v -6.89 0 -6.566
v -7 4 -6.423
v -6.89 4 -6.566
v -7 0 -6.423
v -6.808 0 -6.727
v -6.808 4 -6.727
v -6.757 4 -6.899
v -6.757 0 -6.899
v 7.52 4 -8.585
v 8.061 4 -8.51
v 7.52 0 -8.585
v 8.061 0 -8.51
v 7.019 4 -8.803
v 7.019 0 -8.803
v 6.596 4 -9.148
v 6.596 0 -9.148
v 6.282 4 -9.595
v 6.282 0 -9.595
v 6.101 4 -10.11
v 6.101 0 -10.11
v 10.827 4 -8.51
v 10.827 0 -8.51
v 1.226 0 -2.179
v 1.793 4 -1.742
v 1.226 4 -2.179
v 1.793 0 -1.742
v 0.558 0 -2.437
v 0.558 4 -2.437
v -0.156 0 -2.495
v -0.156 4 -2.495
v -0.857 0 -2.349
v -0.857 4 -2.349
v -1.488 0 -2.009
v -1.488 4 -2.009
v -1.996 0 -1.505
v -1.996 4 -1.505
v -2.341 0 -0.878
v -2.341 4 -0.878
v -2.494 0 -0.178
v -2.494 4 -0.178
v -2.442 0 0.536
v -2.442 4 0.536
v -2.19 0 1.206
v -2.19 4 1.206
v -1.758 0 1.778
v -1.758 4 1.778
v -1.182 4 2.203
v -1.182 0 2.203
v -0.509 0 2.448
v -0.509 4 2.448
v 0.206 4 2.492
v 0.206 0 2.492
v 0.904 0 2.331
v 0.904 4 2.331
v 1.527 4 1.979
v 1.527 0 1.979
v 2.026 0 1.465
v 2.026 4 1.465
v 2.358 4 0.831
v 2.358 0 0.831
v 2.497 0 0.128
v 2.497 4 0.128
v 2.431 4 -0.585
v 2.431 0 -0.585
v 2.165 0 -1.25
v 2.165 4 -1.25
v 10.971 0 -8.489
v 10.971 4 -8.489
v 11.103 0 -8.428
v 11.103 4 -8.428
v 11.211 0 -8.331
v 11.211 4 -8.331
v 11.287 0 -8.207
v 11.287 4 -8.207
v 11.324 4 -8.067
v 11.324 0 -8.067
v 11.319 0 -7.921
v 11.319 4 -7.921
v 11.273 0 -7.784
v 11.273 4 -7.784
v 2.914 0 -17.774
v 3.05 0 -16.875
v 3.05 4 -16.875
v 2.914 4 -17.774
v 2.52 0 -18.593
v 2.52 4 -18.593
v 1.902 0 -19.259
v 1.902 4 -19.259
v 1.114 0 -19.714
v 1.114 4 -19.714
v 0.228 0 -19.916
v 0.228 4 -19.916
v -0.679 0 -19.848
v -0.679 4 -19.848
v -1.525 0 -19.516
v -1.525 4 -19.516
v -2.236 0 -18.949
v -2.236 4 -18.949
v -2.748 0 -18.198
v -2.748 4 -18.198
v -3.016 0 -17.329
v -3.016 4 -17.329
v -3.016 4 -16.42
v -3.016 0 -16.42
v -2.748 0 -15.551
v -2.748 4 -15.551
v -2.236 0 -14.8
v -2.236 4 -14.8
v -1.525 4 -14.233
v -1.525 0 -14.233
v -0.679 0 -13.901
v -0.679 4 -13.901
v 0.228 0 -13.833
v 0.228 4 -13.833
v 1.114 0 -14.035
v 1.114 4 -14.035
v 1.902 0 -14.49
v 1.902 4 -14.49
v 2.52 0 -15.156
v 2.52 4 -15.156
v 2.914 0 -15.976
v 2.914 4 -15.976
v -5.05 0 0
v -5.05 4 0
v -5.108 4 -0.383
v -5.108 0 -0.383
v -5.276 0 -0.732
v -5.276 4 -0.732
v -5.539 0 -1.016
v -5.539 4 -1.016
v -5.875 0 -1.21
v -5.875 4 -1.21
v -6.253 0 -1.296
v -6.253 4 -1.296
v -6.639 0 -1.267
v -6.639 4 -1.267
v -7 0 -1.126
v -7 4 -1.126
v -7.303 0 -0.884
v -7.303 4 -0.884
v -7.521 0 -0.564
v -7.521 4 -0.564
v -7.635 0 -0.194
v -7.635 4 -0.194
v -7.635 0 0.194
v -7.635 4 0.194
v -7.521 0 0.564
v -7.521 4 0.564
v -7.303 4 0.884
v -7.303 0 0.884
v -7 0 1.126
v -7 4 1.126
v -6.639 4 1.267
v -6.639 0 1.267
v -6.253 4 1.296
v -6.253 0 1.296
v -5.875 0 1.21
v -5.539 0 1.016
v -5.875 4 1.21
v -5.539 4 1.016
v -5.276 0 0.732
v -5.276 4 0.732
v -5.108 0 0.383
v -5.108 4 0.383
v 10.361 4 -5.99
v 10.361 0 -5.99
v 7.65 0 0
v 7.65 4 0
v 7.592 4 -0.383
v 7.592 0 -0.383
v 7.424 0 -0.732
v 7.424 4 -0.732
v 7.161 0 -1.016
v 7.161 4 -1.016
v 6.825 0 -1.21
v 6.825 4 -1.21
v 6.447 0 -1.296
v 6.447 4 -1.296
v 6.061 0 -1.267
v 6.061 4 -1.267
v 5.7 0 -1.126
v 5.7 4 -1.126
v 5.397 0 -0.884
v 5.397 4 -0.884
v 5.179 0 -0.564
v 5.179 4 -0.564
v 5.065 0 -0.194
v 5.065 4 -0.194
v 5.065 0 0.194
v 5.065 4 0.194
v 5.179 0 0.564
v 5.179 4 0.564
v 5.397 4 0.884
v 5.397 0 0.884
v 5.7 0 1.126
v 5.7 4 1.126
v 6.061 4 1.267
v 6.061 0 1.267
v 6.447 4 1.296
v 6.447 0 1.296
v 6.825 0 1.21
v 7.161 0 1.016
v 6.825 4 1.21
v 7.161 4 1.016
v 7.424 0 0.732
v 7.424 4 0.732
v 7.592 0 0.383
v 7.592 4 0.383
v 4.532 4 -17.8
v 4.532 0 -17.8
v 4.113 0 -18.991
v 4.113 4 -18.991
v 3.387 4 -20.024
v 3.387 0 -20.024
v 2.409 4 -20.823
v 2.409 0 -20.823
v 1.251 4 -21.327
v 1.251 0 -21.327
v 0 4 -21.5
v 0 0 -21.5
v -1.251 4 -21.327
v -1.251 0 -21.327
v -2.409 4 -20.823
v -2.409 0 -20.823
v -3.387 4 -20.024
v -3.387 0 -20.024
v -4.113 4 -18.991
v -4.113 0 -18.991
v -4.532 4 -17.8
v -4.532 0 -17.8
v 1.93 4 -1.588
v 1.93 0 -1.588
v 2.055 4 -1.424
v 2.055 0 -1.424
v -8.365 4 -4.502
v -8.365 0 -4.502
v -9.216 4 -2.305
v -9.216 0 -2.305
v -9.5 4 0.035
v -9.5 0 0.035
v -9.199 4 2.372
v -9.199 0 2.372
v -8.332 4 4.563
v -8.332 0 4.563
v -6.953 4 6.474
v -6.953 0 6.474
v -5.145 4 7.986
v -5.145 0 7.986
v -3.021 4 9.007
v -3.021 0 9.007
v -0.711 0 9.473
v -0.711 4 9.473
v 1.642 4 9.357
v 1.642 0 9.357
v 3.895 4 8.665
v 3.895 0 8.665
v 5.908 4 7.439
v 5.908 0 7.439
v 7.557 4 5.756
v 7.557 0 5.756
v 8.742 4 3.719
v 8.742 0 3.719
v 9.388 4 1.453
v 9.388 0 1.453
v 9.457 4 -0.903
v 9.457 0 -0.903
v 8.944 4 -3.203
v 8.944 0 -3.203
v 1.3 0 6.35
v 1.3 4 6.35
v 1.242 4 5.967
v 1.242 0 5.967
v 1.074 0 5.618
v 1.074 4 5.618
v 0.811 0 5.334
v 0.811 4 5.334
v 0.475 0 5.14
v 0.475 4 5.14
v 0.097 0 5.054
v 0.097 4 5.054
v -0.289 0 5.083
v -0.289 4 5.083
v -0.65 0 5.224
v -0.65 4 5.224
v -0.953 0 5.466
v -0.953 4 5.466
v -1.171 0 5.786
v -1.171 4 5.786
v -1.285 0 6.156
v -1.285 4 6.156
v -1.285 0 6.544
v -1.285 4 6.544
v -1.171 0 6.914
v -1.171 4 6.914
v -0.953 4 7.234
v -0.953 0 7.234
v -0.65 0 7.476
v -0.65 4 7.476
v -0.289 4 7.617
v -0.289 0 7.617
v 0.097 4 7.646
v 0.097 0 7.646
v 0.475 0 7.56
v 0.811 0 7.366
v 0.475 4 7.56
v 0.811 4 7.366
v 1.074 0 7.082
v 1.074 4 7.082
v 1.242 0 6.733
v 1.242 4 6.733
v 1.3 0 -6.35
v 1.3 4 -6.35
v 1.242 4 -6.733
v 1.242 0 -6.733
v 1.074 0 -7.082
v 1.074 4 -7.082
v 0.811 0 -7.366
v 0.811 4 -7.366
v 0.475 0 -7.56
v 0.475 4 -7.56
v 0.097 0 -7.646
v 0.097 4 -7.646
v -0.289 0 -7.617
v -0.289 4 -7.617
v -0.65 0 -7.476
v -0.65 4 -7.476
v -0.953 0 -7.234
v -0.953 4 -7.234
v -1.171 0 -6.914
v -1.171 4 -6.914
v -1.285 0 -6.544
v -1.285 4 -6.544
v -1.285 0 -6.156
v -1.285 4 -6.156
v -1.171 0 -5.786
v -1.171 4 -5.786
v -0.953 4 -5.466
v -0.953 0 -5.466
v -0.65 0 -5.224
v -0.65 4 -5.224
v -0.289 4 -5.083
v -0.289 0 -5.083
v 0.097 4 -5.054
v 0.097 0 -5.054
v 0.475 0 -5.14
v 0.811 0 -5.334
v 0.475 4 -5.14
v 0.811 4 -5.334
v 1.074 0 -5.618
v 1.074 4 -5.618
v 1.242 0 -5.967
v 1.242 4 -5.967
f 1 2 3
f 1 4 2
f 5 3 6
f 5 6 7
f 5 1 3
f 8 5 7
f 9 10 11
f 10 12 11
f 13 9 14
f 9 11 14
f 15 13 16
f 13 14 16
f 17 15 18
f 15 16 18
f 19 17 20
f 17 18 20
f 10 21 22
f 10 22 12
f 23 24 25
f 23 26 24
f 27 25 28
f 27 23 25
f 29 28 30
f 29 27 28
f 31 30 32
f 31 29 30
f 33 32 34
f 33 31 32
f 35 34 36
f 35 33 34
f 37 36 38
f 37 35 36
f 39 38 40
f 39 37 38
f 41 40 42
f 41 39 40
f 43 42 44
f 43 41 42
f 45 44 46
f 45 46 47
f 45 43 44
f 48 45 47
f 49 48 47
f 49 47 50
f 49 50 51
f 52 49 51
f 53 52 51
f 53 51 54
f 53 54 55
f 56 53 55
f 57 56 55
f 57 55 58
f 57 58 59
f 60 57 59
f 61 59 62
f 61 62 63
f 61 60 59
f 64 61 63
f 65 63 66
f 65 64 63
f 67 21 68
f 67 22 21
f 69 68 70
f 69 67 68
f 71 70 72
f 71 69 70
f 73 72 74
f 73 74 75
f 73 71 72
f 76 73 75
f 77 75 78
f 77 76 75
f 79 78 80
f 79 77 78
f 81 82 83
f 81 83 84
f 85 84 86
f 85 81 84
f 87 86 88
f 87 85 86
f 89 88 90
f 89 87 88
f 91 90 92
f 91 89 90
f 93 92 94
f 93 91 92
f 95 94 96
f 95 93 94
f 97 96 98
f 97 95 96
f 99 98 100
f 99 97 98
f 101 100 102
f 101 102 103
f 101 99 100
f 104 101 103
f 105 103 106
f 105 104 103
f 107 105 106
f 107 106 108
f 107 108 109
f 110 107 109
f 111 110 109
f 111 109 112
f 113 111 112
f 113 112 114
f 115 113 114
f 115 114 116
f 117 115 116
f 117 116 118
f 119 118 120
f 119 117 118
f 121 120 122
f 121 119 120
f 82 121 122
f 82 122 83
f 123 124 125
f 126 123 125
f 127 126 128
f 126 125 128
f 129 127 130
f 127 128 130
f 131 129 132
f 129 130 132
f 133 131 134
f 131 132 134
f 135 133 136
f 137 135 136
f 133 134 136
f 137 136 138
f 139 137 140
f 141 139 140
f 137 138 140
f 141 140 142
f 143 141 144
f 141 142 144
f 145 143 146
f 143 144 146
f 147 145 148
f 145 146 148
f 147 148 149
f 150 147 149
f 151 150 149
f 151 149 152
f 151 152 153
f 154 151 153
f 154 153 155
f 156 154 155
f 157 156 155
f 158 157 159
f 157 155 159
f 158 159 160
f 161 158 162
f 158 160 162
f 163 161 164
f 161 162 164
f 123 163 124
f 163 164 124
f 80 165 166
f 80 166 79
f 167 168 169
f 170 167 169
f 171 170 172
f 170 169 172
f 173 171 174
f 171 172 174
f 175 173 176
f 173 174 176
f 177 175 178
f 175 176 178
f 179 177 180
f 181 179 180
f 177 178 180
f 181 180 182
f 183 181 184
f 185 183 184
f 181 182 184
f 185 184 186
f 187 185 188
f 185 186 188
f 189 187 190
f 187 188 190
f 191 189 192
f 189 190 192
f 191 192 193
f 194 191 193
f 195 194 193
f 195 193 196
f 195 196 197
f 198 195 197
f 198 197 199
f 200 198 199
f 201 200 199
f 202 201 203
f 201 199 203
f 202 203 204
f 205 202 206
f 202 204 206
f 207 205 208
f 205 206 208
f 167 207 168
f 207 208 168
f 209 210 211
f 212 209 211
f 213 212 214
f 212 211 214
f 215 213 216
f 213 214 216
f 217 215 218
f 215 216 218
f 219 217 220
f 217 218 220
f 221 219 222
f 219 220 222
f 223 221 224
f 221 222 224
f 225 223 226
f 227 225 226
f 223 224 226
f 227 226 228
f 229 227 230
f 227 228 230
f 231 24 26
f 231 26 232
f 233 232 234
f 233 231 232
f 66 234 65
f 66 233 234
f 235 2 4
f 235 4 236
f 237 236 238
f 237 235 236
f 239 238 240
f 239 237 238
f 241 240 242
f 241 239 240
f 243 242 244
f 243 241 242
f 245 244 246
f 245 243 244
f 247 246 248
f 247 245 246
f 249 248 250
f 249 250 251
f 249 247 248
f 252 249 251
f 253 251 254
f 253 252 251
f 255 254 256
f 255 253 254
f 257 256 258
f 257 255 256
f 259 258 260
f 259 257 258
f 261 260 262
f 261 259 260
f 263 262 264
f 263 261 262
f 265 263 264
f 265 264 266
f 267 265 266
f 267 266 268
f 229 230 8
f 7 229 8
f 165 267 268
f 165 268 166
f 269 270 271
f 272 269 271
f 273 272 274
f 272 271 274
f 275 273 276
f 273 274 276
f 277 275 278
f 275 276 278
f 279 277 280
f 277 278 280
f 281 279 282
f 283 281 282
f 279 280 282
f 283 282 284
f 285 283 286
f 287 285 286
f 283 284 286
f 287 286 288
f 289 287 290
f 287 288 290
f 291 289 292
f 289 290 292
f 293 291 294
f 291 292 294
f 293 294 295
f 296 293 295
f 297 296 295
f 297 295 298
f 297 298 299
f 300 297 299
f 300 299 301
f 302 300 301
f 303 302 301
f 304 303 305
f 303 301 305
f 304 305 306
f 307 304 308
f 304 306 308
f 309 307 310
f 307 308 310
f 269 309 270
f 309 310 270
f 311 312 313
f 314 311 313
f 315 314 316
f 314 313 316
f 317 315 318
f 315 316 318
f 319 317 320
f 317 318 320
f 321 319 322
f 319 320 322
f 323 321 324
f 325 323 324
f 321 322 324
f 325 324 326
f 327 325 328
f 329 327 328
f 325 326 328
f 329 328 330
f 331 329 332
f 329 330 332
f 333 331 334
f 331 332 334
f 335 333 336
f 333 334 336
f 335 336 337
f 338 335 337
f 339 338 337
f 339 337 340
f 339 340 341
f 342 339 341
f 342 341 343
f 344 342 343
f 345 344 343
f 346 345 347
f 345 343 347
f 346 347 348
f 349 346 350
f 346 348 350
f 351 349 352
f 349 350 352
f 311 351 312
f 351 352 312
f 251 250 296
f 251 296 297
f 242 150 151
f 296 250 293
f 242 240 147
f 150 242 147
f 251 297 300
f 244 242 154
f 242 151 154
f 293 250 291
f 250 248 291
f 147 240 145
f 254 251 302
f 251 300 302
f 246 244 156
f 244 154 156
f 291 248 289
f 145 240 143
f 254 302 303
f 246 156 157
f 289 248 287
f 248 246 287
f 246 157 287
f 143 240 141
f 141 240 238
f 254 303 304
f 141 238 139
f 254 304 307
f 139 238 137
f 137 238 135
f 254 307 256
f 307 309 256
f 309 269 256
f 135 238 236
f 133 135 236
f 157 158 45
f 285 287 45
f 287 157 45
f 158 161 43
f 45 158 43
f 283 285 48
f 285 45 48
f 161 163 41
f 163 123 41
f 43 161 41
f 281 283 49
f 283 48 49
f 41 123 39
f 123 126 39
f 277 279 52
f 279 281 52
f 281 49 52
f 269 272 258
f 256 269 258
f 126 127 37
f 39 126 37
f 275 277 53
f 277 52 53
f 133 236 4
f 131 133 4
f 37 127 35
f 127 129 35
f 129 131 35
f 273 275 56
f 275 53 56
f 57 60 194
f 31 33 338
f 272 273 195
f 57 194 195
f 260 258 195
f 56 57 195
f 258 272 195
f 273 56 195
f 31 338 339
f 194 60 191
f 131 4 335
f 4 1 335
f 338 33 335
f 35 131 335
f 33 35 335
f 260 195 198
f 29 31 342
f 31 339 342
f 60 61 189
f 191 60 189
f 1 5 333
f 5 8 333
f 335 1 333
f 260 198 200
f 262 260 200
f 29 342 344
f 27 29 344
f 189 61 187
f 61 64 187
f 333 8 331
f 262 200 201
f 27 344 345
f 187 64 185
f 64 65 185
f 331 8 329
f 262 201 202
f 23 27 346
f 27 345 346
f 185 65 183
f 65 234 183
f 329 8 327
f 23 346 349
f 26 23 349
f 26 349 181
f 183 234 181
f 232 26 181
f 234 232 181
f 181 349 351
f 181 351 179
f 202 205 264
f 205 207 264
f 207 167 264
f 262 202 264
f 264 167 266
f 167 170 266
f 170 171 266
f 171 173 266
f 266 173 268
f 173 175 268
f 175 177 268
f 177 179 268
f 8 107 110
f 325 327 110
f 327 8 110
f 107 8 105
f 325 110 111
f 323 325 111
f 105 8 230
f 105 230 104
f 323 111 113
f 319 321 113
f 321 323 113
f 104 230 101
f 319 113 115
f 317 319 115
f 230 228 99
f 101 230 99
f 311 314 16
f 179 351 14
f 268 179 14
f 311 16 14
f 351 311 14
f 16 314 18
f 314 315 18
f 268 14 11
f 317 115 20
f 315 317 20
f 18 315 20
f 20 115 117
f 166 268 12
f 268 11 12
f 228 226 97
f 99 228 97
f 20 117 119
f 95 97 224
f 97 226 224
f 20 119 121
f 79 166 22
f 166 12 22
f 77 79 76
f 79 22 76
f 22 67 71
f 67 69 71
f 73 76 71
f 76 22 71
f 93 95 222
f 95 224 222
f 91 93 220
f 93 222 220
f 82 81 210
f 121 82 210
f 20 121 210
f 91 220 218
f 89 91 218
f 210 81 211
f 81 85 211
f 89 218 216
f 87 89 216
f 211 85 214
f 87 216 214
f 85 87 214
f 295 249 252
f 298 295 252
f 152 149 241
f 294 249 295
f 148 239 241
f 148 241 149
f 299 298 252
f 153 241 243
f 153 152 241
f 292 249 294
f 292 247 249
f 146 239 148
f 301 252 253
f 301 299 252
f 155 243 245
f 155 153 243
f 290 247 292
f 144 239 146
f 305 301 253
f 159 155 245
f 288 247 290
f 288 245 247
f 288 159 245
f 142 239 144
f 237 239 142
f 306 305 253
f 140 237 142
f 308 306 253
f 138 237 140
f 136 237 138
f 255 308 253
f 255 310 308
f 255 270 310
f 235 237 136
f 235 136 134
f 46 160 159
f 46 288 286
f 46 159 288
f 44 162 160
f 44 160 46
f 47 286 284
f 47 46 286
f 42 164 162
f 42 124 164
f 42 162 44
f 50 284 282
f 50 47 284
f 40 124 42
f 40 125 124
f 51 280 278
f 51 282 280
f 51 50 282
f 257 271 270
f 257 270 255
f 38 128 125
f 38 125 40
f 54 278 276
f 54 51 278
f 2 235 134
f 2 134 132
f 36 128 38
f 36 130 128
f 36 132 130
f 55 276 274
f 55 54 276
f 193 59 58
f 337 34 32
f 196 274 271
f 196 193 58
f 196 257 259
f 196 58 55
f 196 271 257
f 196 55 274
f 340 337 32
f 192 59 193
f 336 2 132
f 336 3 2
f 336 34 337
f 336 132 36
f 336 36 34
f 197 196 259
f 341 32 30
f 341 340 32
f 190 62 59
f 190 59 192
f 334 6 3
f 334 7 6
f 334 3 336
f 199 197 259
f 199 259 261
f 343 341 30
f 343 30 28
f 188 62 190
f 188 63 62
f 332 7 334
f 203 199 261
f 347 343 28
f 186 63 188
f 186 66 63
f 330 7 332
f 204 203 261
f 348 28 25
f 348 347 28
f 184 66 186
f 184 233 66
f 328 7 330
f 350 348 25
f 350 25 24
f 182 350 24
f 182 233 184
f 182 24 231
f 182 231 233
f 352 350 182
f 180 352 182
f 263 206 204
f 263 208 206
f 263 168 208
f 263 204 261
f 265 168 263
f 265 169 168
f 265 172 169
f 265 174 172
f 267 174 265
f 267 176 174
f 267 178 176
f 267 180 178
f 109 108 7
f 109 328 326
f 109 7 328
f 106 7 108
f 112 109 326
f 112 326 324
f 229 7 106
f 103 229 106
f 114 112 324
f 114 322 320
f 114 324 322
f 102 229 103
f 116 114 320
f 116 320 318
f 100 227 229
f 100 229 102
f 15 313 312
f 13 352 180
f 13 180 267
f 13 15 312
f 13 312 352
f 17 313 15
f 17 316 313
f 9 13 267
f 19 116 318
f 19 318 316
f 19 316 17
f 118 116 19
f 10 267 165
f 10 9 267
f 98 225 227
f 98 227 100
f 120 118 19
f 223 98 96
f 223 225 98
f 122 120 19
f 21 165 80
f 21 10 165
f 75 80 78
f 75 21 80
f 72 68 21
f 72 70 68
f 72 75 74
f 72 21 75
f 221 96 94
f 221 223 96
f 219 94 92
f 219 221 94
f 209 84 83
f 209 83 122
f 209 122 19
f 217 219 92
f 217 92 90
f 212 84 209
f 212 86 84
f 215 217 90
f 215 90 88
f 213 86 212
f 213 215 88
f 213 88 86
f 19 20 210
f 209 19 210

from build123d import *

# Parameters (mm, degrees)
SKETCH1_R           = 3.05
SKETCH1_R_2         = 2.5
BOSS_EXTRUDE1_DEPTH = 4
SKETCH2_R           = 1.3
CUT_EXTRUDE1_DEPTH  = 4
BOSS_EXTRUDE2_DEPTH = 4
BOSS_EXTRUDE3_DEPTH = 4
FILLET1_R           = 1
FILLET9_R           = 0.5
FILLET10_R          = 2


with BuildPart() as part:
    # Sketch1 → Boss-Extrude1 (new body)
    with BuildSketch(Plane(origin=(0, 0, 0), x_dir=(1, 0, 0), z_dir=(0, 1, 0))):
        with BuildLine():
            Line((-4.531642246, 17.7995776), (-7.838367177, 1.6))
            ThreePointArc((-7.838367177, 1.6), (0, -8), (7.838367177, 1.6))
            Line((7.838367177, 1.6), (4.531642246, 17.7995776))
            ThreePointArc((4.531642246, 17.7995776), (0, 21.499648), (-4.531642246, 17.7995776))
        make_face()
        with Locations((0, 16.87456)):
            Circle(SKETCH1_R, mode=Mode.SUBTRACT)
        Circle(SKETCH1_R_2, mode=Mode.SUBTRACT)
    extrude(amount=BOSS_EXTRUDE1_DEPTH)

    # Sketch2 → Cut-Extrude1 (cut)
    with BuildSketch(Plane(origin=(0, 4, 0), x_dir=(1, 0, 0), z_dir=(0, 1, 0))):
        with Locations((0, 6.35)):
            Circle(SKETCH2_R)
        with Locations((6.35, 0)):
            Circle(SKETCH2_R)
        with Locations((0, -6.35)):
            Circle(SKETCH2_R)
        with Locations((-6.35, 0)):
            Circle(SKETCH2_R)
    extrude(amount=-CUT_EXTRUDE1_DEPTH, mode=Mode.SUBTRACT)

    # Sketch3 → Boss-Extrude2 (add)
    with BuildSketch(Plane(origin=(0, 4, 0), x_dir=(1, 0, 0), z_dir=(0, 1, 0))):
        with BuildLine():
            Line((-7.838367177, 1.6), (-6.8136721, 6.619960159))
            ThreePointArc((-6.8136721, 6.619960159), (0, -9.5), (6.8136721, 6.619960159))
            Line((6.8136721, 6.619960159), (7.838367177, 1.6))
            ThreePointArc((7.838367177, 1.6), (0, -8), (-7.838367177, 1.6))
        make_face()
    extrude(amount=-BOSS_EXTRUDE2_DEPTH)

    # Sketch4 → Boss-Extrude3 (add)
    with BuildSketch(Plane(origin=(0, 4, 0), x_dir=(1, 0, 0), z_dir=(0, 1, 0))):
        with BuildLine():
            Line((10.392304845, 8.510381451), (6.42779147, 8.510381451))
            Line((6.42779147, 8.510381451), (6.8136721, 6.619960159))
            Line((6.8136721, 6.619960159), (1.793071605, 1.742094779))
            ThreePointArc((1.793071605, 1.742094779), (1.994303817, 1.507565019), (2.165063509, 1.25))
            Line((2.165063509, 1.25), (5.073143183, 2.928980582))
            Line((5.073143183, 2.928980582), (8.943807158, 3.20286021))
            Line((8.943807158, 3.20286021), (10.361060865, 5.990375719))
            Line((10.361060865, 5.990375719), (11.642304845, 8.510381451))
            Line((11.642304845, 8.510381451), (10.392304845, 8.510381451))
        make_face()
    extrude(amount=-BOSS_EXTRUDE3_DEPTH)

    # Fillet1
    fillet1_edges = [part.edges().sort_by_distance(p)[0] for p in [
        (-6.8136721, 2, -6.619960159),
    ]]
    fillet(fillet1_edges, radius=FILLET1_R)

    # Fillet9
    fillet9_edges = [part.edges().sort_by_distance(p)[0] for p in [
        (11.642304845, 2, -8.510381451),
    ]]
    fillet(fillet9_edges, radius=FILLET9_R)

    # Fillet10
    fillet10_edges = [part.edges().sort_by_distance(p)[0] for p in [
        (6.42779147, 2, -8.510381451),
    ]]
    fillet(fillet10_edges, radius=FILLET10_R)


solid = part.part
